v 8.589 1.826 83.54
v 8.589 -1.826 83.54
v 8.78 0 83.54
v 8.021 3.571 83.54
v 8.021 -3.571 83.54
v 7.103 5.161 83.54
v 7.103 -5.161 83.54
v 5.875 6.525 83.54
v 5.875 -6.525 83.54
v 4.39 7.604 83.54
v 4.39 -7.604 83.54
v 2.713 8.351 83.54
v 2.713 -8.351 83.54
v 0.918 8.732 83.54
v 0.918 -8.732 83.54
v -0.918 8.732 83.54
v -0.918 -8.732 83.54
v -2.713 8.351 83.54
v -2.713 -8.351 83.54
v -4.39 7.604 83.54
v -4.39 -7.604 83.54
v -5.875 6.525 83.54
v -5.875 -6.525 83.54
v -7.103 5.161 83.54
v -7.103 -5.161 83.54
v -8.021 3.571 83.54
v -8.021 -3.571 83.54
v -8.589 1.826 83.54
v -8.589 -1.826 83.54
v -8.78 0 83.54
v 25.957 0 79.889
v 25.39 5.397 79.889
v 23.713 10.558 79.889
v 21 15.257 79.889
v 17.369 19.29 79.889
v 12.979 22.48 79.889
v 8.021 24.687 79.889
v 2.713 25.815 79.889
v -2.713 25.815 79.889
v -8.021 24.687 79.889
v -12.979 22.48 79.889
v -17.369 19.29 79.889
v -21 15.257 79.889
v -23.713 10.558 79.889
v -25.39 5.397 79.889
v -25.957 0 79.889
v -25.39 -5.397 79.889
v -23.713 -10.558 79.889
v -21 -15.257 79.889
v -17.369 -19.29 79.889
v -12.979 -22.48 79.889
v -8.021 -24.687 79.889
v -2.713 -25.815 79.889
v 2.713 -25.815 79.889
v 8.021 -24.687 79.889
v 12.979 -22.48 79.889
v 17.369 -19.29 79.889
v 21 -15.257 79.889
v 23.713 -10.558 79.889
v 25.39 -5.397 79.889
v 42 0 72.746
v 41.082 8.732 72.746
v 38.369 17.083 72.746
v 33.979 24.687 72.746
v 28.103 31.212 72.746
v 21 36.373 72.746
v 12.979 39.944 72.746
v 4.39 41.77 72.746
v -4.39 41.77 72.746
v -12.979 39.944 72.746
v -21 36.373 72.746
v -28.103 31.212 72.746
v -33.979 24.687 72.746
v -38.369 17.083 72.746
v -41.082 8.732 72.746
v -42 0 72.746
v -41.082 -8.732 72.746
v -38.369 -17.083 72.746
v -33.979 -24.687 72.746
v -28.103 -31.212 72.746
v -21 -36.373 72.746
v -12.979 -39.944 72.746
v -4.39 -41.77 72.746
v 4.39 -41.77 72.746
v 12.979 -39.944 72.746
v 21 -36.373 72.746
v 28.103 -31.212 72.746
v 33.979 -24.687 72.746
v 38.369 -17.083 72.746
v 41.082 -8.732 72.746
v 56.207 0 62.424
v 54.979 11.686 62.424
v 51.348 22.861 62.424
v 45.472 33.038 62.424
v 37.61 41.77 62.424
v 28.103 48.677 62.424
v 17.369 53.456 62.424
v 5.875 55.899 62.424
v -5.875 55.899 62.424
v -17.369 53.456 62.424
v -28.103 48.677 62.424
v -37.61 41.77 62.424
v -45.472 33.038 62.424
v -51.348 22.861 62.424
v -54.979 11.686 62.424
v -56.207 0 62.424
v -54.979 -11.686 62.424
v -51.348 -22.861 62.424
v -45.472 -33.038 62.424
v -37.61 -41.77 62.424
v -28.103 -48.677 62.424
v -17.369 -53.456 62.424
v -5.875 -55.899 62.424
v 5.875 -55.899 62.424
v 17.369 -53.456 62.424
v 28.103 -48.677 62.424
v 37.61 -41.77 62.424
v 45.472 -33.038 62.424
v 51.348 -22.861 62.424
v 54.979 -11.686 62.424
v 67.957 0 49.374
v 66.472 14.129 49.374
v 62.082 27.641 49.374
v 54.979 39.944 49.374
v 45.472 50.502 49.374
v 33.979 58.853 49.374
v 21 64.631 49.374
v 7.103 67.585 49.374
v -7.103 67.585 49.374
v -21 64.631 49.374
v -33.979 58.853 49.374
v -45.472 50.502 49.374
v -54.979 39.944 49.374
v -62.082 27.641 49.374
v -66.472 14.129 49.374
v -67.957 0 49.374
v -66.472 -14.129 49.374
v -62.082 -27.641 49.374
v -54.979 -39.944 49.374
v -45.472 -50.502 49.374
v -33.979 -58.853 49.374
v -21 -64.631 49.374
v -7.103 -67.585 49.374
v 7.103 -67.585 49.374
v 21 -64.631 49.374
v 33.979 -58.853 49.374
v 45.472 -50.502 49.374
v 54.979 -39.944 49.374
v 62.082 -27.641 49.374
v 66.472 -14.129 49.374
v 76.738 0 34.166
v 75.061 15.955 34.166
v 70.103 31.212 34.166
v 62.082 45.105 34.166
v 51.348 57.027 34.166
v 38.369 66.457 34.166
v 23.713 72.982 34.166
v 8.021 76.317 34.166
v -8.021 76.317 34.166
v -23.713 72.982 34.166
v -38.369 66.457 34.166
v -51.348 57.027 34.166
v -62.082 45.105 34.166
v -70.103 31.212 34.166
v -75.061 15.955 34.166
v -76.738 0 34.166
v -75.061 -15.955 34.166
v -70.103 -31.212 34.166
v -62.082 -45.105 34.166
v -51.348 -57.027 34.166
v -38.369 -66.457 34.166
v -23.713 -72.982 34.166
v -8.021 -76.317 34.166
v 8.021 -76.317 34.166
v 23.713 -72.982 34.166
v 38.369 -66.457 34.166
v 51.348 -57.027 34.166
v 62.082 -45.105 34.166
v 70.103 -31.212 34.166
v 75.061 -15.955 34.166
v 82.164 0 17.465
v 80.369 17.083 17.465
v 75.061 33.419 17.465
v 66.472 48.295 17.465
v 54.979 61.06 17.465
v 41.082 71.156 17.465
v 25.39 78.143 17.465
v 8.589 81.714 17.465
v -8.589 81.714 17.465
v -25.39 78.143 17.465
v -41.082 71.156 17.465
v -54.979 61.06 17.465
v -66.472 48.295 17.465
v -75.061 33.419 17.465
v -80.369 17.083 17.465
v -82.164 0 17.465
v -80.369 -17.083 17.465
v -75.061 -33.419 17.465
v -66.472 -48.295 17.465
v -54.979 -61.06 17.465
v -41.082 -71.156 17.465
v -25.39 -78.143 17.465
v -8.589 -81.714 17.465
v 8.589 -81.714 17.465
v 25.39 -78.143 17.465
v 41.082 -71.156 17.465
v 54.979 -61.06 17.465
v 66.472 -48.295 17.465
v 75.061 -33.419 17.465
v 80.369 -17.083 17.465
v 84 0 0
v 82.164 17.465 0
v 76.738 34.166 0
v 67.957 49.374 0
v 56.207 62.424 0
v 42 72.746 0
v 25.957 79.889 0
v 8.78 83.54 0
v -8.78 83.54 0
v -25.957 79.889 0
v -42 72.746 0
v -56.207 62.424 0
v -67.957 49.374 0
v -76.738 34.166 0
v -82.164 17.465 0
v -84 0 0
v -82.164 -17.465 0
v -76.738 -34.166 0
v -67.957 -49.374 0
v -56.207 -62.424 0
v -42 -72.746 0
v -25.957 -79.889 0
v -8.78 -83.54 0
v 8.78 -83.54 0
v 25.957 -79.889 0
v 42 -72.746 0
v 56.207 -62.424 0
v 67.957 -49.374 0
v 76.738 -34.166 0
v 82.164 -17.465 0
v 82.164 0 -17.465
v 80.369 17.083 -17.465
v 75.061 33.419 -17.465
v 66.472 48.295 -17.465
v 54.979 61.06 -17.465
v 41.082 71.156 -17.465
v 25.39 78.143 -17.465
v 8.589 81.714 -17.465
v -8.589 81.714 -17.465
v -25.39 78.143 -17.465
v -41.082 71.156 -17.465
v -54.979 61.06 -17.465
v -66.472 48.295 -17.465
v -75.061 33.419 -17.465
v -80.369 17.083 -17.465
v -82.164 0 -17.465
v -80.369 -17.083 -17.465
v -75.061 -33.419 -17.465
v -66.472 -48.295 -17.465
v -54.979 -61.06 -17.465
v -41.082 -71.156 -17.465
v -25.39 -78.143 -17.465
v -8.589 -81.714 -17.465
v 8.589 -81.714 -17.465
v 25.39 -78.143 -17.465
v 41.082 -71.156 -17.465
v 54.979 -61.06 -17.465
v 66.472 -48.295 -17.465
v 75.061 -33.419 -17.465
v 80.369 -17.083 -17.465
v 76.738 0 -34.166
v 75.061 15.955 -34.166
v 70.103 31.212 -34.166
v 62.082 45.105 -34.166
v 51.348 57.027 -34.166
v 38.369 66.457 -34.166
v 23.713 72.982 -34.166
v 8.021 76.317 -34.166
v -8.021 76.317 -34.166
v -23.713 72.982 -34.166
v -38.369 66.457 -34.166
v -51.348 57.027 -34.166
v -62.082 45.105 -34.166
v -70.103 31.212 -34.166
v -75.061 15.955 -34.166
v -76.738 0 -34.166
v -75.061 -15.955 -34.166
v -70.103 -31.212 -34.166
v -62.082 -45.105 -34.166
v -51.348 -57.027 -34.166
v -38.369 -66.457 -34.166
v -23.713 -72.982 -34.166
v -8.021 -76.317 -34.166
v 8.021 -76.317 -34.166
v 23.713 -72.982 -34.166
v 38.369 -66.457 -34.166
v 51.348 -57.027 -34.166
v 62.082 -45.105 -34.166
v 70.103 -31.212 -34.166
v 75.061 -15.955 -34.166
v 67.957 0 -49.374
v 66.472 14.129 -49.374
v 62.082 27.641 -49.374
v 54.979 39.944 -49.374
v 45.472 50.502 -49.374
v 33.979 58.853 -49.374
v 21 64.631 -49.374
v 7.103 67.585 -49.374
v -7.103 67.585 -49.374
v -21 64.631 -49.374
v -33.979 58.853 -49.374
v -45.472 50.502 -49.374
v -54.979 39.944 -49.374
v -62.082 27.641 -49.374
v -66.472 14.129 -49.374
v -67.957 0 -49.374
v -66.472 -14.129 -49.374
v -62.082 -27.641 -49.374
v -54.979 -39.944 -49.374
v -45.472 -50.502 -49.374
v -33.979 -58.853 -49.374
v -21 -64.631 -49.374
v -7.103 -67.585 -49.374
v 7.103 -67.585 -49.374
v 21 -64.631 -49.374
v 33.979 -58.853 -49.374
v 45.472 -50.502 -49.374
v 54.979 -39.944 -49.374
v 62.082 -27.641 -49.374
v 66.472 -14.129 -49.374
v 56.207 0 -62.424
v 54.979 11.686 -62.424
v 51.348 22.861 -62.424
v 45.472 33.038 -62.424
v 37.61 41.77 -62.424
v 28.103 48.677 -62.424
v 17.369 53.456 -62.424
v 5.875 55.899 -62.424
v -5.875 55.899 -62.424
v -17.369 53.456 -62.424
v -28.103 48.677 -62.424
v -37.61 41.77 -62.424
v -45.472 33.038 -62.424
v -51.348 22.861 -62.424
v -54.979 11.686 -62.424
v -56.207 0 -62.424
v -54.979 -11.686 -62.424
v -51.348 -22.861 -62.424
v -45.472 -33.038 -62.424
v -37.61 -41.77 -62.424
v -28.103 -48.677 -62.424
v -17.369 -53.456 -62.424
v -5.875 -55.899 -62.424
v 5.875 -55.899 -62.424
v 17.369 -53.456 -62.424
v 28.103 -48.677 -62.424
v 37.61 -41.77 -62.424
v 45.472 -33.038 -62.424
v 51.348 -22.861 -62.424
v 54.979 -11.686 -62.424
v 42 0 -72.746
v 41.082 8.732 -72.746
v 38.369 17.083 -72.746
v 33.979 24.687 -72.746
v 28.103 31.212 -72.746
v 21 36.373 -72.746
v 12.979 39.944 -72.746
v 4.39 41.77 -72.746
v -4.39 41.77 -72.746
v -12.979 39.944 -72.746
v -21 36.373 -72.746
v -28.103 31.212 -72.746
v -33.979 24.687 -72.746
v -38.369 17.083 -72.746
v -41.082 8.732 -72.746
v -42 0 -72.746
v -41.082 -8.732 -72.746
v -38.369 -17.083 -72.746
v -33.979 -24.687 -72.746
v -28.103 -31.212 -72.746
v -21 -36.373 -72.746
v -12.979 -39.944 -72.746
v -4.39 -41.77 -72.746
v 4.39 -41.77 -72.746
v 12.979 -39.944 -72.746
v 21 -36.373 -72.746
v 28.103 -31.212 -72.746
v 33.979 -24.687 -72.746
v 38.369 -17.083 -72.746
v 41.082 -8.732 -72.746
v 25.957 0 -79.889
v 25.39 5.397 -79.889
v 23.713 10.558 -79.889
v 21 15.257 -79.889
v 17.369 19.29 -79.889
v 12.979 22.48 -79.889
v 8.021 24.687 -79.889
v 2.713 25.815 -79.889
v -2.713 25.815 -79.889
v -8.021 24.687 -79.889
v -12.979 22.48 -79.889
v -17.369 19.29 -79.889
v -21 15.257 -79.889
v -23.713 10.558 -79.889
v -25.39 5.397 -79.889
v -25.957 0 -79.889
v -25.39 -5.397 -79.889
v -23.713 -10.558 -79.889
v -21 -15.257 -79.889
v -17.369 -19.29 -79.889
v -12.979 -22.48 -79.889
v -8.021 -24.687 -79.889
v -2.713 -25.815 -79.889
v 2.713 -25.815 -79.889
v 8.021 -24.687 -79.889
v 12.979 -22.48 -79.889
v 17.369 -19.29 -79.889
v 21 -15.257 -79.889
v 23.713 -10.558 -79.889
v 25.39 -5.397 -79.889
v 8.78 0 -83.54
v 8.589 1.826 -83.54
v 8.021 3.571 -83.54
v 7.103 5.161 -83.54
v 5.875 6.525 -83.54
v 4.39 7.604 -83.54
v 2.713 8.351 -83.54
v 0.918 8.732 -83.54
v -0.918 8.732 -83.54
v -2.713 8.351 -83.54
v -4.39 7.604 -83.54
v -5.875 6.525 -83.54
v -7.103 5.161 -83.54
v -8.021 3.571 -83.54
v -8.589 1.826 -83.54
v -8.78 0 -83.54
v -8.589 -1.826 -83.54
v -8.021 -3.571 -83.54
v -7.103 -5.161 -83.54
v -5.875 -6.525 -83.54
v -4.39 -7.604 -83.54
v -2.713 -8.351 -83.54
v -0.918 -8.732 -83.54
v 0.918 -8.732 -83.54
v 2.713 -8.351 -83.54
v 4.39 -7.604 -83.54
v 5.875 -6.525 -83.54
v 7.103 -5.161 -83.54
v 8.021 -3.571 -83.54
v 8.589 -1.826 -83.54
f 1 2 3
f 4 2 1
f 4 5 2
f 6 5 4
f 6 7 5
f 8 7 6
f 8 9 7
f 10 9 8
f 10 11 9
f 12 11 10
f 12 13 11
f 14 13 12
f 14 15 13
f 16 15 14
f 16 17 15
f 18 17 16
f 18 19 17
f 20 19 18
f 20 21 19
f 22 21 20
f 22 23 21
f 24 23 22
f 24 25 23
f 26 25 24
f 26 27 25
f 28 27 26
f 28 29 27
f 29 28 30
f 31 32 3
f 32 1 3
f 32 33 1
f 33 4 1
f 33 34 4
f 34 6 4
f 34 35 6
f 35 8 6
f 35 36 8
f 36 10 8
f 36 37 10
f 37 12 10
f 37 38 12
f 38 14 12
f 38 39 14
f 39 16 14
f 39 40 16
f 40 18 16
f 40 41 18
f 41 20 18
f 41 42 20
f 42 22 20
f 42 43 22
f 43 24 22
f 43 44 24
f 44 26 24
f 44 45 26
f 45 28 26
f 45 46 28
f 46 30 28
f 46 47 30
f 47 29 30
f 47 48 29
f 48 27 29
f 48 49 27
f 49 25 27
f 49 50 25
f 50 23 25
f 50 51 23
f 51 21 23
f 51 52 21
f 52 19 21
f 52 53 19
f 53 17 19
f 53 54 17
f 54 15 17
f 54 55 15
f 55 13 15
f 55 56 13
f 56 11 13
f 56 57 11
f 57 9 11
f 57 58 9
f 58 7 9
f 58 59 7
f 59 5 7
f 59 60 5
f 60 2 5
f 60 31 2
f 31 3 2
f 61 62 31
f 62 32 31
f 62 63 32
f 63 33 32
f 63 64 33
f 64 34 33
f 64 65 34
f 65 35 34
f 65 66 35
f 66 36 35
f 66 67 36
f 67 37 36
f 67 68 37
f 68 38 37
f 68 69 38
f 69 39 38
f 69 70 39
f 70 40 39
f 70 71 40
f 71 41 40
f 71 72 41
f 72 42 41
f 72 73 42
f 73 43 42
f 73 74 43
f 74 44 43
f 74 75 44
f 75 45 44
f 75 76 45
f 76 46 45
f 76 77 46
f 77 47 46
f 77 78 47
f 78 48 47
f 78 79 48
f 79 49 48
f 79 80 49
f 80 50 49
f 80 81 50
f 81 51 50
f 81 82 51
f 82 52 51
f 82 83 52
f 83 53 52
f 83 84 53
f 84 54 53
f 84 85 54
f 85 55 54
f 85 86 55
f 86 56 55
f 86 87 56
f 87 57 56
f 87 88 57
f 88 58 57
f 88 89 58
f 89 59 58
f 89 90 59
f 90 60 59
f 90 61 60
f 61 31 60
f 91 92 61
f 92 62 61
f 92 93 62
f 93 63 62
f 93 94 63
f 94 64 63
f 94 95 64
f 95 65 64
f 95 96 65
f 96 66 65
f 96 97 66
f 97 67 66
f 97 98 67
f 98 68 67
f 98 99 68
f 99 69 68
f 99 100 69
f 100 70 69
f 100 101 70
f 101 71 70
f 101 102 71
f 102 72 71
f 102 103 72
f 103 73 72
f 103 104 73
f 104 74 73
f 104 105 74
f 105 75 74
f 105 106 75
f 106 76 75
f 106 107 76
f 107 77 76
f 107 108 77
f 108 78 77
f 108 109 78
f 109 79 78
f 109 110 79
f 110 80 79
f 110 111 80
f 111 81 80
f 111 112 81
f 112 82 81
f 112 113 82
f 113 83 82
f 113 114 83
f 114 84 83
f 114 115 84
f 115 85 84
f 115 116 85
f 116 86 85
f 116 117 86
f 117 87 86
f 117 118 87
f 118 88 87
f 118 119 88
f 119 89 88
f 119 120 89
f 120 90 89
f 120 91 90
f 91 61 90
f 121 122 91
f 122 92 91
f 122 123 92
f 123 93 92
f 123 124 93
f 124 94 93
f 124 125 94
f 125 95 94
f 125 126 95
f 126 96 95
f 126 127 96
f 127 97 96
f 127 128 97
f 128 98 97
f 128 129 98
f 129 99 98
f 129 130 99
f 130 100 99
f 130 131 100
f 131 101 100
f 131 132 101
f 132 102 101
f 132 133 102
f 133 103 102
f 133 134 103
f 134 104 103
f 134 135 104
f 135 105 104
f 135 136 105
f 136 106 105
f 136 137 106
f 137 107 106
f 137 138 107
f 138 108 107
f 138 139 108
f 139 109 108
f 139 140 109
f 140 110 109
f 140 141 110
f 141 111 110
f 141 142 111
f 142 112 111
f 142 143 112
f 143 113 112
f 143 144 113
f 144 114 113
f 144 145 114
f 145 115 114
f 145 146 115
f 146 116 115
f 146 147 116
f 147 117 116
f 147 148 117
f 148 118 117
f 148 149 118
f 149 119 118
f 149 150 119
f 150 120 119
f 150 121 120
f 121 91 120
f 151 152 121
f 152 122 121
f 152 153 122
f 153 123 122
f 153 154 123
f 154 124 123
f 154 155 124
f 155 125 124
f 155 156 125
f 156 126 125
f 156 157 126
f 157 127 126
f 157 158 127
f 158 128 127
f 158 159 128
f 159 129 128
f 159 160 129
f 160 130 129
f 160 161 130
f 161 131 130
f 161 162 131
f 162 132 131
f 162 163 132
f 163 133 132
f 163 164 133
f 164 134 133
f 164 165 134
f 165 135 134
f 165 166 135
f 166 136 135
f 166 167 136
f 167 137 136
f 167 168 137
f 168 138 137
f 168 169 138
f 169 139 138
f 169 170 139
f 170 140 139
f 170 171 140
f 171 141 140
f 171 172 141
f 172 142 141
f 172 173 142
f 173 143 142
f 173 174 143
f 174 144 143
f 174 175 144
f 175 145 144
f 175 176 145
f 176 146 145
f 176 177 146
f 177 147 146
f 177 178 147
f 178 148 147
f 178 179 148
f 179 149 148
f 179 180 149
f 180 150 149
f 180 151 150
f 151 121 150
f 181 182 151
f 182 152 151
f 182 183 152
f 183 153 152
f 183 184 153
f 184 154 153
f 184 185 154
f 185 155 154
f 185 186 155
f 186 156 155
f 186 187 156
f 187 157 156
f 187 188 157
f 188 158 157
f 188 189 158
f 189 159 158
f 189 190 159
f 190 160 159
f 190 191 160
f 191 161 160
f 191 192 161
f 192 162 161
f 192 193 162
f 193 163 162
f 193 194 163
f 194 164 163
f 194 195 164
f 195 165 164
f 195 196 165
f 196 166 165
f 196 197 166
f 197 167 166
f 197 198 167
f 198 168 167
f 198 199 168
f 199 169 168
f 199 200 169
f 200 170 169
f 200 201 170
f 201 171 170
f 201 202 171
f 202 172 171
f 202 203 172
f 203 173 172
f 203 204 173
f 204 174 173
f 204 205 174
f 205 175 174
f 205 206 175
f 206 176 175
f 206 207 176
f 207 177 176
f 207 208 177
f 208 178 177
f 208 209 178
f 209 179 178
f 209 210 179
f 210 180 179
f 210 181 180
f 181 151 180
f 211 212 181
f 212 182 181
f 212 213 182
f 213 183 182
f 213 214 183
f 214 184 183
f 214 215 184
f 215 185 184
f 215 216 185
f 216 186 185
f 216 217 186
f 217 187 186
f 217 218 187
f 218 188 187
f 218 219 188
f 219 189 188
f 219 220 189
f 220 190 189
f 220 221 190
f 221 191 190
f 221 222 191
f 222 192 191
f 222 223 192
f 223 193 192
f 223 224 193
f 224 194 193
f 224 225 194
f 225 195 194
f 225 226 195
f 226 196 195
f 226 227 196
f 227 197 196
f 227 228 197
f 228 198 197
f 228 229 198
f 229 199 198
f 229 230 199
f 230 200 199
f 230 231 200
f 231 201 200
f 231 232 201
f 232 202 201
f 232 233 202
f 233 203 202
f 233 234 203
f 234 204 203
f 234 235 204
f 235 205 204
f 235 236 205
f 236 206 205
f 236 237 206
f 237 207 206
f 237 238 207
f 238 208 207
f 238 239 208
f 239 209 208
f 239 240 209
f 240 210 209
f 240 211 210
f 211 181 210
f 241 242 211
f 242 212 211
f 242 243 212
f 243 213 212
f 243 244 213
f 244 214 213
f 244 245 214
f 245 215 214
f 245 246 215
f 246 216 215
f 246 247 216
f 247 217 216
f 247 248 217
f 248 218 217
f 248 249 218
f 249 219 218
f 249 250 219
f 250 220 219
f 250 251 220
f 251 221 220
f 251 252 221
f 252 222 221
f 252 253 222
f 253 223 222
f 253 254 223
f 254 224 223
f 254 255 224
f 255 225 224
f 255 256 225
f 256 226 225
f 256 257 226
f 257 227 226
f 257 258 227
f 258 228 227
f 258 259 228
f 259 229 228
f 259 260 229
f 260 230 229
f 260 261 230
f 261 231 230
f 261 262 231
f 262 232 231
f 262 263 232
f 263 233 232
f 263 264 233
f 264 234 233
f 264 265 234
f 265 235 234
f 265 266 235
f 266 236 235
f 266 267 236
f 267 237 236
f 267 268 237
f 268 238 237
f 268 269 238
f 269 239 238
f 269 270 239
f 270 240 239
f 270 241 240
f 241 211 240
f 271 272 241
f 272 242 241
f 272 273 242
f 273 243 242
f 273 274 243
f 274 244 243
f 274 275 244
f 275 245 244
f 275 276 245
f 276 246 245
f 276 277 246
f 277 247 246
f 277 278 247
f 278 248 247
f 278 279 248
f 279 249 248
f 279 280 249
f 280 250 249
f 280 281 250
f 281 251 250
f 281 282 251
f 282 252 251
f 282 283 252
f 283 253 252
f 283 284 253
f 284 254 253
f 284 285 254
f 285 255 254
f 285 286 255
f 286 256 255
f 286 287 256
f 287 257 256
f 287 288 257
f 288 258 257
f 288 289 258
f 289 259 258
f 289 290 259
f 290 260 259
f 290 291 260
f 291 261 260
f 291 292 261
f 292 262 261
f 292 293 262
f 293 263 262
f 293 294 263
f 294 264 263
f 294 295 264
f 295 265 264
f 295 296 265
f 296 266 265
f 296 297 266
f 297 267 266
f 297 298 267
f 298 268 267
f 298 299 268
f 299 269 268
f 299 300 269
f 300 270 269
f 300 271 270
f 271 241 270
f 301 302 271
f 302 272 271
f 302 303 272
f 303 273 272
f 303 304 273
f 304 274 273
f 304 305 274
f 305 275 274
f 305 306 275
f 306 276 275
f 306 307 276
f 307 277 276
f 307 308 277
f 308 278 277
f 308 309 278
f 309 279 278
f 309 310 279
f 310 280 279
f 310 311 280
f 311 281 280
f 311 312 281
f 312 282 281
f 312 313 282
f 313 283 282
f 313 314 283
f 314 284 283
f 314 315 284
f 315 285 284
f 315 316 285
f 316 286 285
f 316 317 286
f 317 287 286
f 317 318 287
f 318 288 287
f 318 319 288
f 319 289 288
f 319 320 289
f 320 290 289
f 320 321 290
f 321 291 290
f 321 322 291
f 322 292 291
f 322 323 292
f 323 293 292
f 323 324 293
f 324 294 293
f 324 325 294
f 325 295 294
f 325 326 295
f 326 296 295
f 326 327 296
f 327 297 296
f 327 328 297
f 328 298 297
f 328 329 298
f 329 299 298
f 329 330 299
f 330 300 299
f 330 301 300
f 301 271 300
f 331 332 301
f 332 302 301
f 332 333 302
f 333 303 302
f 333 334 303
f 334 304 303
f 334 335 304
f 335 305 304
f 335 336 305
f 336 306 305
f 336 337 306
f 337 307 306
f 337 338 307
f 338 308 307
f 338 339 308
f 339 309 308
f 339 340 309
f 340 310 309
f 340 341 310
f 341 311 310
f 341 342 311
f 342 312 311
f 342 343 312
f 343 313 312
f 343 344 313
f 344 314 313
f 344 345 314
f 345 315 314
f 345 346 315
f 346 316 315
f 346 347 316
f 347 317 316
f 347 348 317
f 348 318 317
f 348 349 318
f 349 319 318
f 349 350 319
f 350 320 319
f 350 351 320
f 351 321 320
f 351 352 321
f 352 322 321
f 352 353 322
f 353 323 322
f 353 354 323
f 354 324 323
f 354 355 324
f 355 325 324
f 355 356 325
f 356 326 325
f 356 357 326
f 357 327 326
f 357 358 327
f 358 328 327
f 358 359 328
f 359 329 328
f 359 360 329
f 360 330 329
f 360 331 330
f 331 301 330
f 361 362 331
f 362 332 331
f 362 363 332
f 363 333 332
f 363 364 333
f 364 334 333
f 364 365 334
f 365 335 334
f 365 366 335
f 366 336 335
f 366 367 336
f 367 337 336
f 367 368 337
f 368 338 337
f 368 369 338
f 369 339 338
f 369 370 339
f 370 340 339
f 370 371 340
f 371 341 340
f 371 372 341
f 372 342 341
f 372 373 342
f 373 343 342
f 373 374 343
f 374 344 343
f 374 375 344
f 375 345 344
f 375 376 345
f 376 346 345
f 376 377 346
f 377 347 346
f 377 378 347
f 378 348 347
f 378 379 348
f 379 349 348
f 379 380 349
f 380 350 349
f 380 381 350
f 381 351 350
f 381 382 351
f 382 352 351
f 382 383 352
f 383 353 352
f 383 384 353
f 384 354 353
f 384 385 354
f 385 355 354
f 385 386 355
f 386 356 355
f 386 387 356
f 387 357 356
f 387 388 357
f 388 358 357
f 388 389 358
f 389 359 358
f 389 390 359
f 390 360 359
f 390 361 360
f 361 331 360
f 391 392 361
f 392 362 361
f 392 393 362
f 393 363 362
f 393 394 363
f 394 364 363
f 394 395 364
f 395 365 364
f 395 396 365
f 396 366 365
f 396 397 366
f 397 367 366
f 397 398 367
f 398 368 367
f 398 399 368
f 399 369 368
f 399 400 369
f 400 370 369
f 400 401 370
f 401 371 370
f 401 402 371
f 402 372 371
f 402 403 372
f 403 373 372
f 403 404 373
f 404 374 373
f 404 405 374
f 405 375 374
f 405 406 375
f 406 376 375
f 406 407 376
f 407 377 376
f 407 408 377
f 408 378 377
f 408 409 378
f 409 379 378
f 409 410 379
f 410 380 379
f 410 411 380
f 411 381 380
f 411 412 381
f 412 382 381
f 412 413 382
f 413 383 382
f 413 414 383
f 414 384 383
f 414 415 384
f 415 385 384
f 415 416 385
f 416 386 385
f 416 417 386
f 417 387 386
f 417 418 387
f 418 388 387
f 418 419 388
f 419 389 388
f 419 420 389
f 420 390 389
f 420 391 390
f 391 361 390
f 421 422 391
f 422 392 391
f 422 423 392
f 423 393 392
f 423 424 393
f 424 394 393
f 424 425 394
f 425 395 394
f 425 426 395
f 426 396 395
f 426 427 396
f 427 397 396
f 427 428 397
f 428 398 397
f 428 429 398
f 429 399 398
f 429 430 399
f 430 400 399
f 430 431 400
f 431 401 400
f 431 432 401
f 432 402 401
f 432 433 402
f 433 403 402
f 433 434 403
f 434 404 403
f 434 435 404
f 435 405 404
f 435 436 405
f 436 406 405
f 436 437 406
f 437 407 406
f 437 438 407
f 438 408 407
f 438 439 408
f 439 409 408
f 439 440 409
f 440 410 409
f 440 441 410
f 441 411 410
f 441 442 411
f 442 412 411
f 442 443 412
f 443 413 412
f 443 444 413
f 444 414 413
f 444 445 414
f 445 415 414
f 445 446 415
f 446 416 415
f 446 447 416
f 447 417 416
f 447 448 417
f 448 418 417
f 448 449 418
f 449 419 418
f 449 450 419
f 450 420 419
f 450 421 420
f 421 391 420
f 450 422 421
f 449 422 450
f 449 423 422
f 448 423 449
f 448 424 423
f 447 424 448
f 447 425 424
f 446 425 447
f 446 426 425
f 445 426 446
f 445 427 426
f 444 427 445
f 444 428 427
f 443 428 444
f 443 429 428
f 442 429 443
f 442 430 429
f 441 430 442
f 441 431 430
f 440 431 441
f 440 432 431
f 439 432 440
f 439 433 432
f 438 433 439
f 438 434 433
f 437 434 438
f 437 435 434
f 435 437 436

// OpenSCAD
// A module file that wraps its demo call and module definition in a bare
// { } block, matching a real-world pattern used to hide helper variables
// from the Customizer while a standalone demo call still renders when this
// file is opened directly (not `use`'d).
someVar = 42;

{
  helperSize = someVar * 2;

  usedHelper(helperSize);

  module usedHelper(size) {
    sphere(r=size);
  }
}
